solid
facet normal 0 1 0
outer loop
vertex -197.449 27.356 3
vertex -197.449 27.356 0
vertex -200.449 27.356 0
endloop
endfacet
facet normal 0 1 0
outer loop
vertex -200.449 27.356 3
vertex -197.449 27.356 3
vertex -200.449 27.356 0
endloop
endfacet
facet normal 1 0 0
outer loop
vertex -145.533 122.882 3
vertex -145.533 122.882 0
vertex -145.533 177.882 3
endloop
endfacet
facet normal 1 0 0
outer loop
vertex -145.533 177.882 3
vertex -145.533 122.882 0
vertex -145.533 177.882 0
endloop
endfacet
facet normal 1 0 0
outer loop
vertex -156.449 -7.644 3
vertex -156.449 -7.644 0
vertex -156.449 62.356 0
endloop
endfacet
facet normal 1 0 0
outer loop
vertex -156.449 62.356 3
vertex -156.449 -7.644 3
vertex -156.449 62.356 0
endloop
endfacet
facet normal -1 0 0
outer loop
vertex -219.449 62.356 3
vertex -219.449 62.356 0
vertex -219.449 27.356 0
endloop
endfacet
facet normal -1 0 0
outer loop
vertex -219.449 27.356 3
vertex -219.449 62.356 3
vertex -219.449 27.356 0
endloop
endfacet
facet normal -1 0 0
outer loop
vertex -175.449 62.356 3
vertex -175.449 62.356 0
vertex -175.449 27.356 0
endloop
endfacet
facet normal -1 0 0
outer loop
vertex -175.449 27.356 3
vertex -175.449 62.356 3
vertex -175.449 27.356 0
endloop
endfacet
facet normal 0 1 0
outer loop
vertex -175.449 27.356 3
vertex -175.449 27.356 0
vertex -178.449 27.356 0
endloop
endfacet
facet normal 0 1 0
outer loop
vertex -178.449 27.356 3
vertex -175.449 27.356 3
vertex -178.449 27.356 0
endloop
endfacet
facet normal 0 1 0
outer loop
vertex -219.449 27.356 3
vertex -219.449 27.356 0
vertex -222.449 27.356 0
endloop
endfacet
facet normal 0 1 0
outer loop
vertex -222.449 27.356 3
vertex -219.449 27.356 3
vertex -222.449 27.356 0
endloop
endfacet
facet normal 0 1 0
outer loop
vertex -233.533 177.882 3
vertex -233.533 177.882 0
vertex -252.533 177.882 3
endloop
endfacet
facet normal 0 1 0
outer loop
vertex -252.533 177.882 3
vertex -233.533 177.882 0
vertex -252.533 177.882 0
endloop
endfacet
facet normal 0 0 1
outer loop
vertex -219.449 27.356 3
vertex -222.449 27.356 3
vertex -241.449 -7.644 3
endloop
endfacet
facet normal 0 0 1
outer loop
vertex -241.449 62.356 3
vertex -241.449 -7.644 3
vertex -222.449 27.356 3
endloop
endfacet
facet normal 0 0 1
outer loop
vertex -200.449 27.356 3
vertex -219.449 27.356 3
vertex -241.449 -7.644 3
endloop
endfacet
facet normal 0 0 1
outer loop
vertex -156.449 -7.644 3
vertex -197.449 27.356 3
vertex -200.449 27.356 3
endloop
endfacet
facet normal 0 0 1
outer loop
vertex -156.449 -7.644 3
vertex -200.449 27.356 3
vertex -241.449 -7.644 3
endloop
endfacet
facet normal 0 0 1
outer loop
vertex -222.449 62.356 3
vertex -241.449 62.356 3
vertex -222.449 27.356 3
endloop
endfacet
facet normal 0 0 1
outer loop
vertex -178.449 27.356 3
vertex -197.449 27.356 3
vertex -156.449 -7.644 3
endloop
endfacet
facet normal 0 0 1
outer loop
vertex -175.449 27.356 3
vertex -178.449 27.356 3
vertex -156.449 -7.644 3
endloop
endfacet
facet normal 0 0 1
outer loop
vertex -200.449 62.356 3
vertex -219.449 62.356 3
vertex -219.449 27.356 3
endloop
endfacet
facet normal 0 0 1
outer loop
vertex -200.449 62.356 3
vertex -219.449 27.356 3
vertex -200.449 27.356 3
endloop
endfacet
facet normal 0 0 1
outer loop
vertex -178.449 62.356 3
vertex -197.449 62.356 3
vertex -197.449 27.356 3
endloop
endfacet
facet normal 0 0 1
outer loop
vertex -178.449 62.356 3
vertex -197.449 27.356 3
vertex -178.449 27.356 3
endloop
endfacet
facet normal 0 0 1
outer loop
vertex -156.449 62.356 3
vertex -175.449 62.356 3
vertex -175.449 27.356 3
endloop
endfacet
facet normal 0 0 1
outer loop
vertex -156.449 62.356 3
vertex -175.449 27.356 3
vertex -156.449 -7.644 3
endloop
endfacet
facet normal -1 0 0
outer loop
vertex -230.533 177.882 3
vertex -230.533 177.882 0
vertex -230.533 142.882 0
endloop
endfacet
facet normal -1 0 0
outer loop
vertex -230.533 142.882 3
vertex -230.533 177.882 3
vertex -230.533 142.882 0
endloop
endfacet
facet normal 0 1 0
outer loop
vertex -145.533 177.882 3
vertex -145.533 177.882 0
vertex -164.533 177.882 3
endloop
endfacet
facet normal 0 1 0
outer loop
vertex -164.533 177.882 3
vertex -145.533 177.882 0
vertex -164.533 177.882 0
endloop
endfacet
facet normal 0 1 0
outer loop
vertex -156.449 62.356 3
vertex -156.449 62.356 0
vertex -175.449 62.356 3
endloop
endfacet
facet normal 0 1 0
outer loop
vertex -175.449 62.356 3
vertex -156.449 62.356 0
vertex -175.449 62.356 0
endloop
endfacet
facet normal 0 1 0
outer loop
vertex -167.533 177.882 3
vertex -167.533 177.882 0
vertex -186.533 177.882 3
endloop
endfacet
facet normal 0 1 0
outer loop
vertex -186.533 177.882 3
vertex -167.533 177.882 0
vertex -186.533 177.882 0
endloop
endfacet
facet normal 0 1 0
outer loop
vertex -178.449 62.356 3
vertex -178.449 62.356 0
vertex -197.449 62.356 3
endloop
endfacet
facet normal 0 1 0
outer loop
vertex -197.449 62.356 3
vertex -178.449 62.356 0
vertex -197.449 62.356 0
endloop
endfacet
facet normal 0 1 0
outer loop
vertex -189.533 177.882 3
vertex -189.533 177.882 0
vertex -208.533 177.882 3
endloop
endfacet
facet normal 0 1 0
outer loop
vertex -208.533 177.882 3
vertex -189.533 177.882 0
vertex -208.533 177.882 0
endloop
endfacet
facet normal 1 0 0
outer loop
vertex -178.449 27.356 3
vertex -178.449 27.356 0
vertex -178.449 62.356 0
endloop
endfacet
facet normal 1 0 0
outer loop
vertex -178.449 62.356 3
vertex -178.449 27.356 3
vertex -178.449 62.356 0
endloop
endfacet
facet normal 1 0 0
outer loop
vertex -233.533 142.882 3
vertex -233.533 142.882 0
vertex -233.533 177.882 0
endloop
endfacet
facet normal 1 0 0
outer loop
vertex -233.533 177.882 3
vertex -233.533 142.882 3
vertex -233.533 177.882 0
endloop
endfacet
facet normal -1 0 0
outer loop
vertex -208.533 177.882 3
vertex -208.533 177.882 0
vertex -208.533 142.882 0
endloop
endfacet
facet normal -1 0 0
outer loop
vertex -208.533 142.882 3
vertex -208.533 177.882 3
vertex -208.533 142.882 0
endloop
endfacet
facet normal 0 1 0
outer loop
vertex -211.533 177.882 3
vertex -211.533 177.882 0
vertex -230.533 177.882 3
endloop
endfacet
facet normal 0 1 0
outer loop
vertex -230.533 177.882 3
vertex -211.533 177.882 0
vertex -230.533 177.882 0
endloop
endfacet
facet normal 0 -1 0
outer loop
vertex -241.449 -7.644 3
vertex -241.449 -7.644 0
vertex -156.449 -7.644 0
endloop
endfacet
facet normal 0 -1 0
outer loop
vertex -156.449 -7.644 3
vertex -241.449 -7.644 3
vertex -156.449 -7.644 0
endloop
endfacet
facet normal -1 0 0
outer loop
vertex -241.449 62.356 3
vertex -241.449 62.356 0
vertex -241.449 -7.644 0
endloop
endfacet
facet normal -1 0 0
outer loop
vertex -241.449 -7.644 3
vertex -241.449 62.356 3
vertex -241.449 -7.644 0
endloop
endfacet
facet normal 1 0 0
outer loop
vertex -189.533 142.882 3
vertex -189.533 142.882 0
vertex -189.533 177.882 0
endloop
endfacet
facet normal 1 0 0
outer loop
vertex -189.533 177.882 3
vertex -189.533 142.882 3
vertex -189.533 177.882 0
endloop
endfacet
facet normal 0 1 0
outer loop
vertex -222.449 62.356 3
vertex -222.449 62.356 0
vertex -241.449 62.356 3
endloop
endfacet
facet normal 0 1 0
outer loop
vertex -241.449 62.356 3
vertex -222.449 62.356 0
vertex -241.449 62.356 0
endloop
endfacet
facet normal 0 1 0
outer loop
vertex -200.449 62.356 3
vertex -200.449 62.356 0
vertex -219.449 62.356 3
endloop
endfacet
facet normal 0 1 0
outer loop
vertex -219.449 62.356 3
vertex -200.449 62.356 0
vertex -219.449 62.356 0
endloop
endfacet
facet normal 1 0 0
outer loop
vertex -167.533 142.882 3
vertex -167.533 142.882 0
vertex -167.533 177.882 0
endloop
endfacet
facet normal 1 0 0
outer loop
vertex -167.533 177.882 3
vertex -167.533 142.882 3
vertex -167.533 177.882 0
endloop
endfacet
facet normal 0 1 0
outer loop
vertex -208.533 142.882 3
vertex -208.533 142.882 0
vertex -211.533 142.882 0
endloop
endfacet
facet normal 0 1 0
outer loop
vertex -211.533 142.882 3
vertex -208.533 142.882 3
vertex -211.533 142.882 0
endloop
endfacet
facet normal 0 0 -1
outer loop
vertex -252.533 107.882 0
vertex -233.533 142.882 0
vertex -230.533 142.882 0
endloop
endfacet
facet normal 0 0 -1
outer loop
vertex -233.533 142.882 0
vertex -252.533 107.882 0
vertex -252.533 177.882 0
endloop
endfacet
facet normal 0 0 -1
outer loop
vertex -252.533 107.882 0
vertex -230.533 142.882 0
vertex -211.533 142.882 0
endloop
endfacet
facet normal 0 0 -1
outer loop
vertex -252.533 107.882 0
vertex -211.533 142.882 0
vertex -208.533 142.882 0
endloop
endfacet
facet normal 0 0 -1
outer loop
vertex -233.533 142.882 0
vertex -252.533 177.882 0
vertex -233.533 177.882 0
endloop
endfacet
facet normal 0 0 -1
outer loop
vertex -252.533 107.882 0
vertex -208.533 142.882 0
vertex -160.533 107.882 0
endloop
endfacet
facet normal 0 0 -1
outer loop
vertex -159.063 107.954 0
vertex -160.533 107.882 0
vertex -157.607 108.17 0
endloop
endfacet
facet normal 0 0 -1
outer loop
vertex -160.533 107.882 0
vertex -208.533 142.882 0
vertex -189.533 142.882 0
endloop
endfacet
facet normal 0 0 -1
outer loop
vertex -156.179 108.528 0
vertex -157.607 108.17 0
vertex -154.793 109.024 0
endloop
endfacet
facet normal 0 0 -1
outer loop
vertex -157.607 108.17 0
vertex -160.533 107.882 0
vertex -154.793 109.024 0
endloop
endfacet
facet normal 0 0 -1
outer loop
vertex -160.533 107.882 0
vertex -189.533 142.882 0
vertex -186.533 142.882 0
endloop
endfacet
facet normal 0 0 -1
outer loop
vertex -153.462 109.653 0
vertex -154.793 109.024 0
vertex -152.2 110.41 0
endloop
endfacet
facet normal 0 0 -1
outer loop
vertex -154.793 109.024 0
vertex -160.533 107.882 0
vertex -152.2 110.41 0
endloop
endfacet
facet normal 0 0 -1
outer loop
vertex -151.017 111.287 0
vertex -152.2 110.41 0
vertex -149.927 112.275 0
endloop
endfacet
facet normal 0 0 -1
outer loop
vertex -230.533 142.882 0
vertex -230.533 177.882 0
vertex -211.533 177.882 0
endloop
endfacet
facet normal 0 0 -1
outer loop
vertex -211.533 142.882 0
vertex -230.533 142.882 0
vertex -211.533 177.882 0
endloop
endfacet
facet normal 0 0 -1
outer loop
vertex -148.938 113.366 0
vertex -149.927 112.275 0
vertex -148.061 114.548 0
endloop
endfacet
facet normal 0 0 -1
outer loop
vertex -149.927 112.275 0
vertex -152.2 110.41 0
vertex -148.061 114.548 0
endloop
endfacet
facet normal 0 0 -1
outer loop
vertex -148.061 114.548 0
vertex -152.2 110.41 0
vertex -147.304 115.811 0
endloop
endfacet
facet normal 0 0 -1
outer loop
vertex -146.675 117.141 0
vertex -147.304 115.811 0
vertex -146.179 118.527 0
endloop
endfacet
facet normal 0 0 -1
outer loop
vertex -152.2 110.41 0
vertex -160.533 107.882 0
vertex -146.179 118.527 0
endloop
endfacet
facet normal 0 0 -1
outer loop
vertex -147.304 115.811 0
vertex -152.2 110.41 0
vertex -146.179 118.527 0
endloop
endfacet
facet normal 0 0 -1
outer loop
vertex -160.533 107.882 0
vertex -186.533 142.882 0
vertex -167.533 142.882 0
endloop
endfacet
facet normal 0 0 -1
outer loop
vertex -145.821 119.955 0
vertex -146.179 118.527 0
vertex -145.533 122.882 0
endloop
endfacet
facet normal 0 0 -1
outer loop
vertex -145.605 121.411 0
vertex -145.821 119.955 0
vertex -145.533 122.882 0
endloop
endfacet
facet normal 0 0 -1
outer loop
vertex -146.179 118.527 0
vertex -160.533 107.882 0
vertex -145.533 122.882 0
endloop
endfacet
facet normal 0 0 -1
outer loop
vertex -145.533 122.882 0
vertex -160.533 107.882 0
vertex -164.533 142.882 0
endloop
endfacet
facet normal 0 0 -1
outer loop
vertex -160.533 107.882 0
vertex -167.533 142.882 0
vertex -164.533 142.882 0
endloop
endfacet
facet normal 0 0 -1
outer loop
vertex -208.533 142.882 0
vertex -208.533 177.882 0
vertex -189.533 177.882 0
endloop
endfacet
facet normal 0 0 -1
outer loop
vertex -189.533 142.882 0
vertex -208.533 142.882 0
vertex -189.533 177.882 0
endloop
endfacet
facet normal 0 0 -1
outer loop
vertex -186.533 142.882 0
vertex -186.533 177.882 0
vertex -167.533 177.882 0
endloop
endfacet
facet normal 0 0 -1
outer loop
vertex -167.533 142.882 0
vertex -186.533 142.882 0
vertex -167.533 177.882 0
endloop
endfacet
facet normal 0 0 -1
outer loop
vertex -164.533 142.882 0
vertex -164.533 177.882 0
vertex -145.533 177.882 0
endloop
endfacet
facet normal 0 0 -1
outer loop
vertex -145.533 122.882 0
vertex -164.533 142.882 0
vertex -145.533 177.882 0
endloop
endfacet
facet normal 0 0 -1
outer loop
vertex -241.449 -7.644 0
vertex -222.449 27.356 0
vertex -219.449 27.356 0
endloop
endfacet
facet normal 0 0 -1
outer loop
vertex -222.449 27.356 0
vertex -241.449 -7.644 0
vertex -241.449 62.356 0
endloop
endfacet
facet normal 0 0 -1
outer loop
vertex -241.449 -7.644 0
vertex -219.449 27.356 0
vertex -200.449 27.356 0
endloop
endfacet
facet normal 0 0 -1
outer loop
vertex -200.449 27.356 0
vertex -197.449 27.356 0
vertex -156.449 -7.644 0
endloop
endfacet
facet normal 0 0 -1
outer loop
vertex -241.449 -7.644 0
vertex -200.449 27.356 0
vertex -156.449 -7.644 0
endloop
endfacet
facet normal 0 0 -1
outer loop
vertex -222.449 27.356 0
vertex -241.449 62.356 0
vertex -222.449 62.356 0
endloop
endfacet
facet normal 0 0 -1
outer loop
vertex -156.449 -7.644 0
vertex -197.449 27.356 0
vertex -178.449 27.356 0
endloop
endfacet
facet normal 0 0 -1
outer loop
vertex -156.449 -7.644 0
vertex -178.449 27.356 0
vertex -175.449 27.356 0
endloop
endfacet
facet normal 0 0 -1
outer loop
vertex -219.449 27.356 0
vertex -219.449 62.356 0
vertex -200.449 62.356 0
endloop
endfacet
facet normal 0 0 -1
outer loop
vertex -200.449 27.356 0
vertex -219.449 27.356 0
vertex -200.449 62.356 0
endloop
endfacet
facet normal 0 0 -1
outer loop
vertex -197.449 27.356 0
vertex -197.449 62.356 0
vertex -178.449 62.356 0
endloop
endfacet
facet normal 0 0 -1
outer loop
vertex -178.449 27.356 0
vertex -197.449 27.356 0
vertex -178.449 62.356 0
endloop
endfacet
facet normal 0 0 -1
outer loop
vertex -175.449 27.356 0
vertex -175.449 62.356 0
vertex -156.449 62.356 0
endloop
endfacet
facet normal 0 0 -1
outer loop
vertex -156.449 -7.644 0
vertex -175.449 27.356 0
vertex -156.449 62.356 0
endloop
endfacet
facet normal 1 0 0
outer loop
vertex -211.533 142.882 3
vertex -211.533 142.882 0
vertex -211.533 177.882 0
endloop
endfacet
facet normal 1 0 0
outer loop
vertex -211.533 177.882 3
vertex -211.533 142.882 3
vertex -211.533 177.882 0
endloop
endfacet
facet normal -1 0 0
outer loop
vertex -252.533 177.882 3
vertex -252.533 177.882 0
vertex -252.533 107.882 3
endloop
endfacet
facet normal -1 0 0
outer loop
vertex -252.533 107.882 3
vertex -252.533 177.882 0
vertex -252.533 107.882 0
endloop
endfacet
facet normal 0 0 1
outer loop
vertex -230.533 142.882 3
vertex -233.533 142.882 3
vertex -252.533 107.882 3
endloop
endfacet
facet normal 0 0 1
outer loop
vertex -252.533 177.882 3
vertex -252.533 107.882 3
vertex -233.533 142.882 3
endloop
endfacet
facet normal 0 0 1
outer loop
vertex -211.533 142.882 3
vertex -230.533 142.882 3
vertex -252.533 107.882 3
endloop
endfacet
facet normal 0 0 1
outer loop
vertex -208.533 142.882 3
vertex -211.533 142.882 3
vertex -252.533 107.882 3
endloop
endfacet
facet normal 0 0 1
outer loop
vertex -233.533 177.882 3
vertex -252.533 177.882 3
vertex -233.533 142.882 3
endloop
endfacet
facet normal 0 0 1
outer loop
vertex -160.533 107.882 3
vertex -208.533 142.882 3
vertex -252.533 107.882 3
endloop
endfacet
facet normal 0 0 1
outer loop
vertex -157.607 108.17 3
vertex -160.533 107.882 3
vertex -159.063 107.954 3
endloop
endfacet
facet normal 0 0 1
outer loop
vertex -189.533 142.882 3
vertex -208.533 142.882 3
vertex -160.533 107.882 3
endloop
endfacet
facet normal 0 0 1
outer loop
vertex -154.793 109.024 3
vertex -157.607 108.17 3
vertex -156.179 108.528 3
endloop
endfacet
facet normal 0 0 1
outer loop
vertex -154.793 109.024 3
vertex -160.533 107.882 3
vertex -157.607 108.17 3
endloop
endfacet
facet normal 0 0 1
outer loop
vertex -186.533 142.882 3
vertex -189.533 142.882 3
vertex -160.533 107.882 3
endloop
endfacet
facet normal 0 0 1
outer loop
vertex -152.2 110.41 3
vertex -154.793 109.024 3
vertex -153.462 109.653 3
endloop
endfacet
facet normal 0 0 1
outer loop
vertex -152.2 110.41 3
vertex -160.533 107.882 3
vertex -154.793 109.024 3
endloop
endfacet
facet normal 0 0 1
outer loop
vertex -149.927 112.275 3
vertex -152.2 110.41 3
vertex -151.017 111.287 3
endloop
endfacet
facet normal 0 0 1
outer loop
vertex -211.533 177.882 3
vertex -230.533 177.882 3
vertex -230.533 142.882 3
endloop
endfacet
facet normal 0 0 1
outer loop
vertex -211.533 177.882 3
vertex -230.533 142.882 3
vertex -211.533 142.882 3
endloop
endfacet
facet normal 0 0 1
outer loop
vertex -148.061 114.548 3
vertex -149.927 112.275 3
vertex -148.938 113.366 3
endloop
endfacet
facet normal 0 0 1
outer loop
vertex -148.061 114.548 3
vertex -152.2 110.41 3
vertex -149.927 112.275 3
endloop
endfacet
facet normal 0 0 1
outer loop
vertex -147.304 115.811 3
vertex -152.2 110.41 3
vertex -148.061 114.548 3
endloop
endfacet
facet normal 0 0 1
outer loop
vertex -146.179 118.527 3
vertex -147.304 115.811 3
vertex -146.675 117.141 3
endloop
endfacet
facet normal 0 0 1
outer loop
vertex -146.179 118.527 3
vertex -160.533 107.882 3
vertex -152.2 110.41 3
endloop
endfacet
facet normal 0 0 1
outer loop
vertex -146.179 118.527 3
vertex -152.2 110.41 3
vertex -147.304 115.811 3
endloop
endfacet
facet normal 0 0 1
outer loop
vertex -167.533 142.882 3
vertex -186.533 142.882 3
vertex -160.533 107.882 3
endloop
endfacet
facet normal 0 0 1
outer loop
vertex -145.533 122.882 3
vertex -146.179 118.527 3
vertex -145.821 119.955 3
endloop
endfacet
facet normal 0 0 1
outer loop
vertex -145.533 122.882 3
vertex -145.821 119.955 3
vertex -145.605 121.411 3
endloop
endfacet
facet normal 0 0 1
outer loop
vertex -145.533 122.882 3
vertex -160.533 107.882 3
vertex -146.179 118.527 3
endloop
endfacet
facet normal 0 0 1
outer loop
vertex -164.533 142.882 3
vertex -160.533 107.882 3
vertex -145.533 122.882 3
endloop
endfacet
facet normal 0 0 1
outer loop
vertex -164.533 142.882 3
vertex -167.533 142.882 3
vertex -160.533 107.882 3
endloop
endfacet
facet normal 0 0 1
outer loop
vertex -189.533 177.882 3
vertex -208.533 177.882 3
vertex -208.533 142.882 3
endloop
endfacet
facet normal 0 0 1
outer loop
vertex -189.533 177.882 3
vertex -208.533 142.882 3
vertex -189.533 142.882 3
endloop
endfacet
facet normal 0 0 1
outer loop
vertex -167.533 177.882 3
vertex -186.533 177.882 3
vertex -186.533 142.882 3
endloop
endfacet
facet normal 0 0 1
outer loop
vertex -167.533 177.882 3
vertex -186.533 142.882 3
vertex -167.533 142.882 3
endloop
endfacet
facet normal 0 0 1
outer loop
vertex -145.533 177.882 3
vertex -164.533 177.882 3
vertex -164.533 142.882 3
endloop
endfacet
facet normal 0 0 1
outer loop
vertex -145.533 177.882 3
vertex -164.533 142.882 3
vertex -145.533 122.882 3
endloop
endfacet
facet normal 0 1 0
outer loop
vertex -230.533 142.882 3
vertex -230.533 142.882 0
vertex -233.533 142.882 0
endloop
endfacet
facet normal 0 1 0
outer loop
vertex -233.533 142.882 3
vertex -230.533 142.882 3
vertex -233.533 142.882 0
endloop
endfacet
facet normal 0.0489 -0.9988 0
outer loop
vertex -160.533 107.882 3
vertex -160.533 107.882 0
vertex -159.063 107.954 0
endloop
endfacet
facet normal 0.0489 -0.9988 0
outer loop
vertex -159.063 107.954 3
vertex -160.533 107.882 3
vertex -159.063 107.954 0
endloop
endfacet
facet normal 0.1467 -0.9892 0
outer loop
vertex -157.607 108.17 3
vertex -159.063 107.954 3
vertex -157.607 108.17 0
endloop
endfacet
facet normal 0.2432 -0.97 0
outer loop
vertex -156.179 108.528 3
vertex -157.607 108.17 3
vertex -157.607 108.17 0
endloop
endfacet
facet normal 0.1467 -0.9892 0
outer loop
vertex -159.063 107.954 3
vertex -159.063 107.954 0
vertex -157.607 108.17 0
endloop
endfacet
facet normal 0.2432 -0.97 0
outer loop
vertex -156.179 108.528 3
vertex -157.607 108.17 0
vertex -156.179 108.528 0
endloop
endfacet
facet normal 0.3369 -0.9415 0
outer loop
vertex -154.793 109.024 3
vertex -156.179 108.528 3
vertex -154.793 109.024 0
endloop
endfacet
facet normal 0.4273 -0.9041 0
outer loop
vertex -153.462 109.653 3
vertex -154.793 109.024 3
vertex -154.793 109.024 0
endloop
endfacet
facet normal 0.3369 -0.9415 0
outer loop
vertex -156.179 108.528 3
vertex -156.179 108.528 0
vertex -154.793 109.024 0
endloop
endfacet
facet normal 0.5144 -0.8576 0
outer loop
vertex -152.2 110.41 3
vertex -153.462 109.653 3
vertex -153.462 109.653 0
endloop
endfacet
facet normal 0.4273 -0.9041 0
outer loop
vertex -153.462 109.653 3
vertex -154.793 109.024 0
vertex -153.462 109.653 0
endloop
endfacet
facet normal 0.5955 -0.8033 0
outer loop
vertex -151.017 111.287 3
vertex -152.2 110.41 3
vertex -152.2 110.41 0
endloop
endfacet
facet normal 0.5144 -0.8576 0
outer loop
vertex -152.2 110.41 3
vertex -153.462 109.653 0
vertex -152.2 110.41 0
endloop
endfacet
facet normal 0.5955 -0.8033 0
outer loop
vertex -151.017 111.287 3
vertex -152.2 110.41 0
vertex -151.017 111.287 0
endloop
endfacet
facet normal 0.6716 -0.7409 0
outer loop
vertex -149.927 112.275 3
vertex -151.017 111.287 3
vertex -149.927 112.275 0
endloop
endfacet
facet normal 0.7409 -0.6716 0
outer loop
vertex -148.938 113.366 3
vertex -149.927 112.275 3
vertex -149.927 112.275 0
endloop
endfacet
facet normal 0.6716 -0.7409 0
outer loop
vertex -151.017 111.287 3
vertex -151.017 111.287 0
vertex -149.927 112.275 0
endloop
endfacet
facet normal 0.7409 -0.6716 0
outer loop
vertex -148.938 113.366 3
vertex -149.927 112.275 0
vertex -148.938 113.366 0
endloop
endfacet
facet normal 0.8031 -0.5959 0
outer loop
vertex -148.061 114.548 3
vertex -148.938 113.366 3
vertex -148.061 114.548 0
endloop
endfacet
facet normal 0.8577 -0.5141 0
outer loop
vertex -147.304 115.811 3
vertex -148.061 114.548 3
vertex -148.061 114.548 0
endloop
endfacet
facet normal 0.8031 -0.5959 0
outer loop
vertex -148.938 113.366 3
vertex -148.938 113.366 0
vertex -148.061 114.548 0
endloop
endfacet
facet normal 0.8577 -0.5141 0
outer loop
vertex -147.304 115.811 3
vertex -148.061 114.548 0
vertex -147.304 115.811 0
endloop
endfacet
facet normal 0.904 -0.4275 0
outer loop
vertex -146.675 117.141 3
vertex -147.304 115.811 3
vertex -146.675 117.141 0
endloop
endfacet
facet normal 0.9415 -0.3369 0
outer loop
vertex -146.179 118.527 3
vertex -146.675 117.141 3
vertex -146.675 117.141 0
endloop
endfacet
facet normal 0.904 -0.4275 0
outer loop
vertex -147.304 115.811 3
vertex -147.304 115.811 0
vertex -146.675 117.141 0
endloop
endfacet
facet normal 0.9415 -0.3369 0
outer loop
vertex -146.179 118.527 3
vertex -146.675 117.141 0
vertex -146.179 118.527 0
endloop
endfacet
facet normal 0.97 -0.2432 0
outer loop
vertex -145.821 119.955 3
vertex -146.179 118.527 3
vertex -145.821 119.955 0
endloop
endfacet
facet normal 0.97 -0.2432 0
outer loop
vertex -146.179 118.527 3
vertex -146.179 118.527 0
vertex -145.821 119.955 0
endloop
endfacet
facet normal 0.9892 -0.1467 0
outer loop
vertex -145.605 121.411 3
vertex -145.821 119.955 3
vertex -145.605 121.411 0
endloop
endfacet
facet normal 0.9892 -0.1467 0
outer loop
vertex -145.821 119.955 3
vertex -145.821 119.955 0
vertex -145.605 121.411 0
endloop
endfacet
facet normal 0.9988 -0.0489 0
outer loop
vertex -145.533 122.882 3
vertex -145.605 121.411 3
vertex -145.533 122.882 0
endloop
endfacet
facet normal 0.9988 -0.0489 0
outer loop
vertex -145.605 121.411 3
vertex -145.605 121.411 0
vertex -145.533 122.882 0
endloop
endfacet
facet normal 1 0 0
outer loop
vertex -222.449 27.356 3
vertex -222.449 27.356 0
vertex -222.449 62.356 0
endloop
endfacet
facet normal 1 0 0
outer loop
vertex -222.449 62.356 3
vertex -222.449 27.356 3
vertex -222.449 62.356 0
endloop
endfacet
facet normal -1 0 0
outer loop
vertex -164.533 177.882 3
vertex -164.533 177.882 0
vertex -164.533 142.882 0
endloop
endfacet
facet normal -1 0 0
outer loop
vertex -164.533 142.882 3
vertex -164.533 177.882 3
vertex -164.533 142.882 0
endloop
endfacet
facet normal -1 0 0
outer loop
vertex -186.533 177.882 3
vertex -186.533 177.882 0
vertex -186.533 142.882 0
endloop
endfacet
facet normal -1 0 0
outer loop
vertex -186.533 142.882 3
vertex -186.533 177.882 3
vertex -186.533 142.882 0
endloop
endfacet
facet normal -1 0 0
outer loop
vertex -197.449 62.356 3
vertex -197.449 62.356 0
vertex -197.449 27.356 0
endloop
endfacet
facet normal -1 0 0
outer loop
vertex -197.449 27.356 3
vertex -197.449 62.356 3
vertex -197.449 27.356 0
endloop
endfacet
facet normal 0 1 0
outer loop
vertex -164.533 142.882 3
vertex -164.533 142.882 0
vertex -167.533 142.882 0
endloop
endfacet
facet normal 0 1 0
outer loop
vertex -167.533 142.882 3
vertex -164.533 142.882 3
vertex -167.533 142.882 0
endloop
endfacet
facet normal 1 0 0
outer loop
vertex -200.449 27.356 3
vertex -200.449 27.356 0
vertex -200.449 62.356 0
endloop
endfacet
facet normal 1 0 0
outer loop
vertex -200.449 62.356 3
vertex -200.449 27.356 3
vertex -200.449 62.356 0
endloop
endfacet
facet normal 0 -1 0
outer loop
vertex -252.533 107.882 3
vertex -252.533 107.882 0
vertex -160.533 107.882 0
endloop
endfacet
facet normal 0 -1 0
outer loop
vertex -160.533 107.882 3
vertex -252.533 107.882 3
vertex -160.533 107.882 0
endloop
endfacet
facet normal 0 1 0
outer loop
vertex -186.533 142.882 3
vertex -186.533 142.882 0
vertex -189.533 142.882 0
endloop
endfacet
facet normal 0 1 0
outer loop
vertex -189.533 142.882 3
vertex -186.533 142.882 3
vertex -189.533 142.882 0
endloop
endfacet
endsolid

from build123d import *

# Parameters (mm, degrees)
F1_DEPTH = 3


with BuildPart() as f1:
    # F0 (on Top) → F1 (new body)
    with BuildSketch(Plane.XY):
        with BuildLine():
            Line((-233.533201, 177.881735), (-252.533201, 177.881735))
            Line((-252.533201, 177.881735), (-252.533201, 107.881735))
            Line((-252.533201, 107.881735), (-160.533201, 107.881735))
            ThreePointArc((-160.533201, 107.881735), (-149.926599, 112.275133), (-145.533201, 122.881735))
            Line((-145.533201, 122.881735), (-145.533201, 177.881735))
            Line((-145.533201, 177.881735), (-164.533201, 177.881735))
            Line((-164.533201, 177.881735), (-164.533201, 142.881735))
            Line((-164.533201, 142.881735), (-167.533201, 142.881735))
            Line((-167.533201, 142.881735), (-167.533201, 177.881735))
            Line((-167.533201, 177.881735), (-186.533201, 177.881735))
            Line((-186.533201, 177.881735), (-186.533201, 142.881735))
            Line((-186.533201, 142.881735), (-189.533201, 142.881735))
            Line((-189.533201, 142.881735), (-189.533201, 177.881735))
            Line((-189.533201, 177.881735), (-208.533201, 177.881735))
            Line((-208.533201, 177.881735), (-208.533201, 142.881735))
            Line((-208.533201, 142.881735), (-211.533201, 142.881735))
            Line((-211.533201, 142.881735), (-211.533201, 177.881735))
            Line((-211.533201, 177.881735), (-230.533201, 177.881735))
            Line((-230.533201, 177.881735), (-230.533201, 142.881735))
            Line((-230.533201, 142.881735), (-233.533201, 142.881735))
            Line((-233.533201, 142.881735), (-233.533201, 177.881735))
        make_face()
        Polygon((-222.448504, 62.355831), (-241.448504, 62.355831), (-241.448504, -7.644169), (-156.448504, -7.644169), (-156.448504, 62.355831), (-175.448504, 62.355831), (-175.448504, 27.355831), (-178.448504, 27.355831), (-178.448504, 62.355831), (-197.448504, 62.355831), (-197.448504, 27.355831), (-200.448504, 27.355831), (-200.448504, 62.355831), (-219.448504, 62.355831), (-219.448504, 27.355831), (-222.448504, 27.355831), align=None)
    extrude(amount=F1_DEPTH)


solid = f1.part
